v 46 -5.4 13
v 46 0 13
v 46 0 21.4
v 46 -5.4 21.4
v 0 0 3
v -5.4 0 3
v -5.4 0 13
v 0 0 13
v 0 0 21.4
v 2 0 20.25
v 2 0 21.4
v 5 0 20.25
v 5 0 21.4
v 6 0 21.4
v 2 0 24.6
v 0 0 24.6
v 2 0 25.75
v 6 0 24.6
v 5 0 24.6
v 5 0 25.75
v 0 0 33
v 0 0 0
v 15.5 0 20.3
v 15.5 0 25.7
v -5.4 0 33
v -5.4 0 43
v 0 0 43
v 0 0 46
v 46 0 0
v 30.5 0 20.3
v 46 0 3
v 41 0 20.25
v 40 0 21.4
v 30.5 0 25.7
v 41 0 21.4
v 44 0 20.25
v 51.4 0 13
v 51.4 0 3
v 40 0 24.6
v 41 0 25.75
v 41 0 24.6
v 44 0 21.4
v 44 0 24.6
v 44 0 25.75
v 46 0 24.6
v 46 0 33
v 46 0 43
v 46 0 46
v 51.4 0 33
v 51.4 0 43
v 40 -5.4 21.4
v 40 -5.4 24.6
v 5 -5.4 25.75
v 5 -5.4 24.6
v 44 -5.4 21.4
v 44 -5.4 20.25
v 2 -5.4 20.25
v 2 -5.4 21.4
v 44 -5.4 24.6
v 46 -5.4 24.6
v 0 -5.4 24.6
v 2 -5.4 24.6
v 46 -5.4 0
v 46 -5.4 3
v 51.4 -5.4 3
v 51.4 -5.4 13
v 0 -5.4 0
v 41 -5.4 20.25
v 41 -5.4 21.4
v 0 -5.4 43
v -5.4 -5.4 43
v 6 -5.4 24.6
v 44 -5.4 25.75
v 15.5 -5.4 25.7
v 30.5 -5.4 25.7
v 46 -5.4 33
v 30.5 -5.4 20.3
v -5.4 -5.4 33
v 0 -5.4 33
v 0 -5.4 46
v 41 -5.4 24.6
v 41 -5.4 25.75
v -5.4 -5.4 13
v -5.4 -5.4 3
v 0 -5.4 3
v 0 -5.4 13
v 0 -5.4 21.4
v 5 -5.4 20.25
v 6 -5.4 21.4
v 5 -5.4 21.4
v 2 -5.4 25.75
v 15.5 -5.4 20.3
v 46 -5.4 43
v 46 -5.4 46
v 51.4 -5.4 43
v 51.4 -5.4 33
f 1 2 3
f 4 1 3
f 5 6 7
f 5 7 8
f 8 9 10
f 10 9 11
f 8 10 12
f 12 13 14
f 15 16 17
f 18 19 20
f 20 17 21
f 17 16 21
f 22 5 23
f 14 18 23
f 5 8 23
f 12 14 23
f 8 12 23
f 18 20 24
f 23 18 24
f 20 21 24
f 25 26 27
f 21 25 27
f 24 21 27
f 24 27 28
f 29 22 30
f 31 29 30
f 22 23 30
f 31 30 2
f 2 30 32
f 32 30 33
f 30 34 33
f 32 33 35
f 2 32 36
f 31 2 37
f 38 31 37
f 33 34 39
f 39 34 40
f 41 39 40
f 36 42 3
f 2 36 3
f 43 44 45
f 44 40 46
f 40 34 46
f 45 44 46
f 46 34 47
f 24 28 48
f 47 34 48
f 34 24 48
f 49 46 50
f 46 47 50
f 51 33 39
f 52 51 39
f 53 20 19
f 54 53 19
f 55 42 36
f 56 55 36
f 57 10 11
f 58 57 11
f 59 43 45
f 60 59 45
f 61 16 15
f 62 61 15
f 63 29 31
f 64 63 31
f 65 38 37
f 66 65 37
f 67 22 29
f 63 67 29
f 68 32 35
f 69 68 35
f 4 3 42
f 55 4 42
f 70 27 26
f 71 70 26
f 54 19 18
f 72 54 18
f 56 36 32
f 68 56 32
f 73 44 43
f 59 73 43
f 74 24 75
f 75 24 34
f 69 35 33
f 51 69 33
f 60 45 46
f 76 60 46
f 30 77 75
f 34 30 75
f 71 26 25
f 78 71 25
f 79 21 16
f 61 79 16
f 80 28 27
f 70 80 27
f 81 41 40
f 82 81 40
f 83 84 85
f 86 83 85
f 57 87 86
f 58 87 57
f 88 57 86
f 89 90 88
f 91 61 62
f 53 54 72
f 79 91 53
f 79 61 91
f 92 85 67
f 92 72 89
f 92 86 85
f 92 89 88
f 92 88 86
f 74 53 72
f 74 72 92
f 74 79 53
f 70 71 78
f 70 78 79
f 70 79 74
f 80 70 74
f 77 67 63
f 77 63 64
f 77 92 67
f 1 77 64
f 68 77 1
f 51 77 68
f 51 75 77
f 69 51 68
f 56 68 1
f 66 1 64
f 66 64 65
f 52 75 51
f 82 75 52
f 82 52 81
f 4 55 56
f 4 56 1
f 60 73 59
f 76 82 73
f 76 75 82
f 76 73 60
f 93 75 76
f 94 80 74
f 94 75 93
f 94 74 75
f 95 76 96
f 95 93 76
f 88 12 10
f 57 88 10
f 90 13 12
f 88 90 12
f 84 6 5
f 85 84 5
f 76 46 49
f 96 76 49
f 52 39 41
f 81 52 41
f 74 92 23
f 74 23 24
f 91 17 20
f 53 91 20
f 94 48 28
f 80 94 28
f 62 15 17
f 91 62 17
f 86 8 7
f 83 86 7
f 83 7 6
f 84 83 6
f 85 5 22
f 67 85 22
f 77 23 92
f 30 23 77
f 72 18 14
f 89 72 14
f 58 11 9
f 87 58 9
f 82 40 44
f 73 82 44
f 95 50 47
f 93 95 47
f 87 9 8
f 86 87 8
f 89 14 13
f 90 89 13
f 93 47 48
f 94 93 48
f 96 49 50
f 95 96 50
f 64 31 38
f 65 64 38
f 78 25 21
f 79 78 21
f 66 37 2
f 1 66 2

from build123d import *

# Parameters (mm, degrees)
F1_W     = 15
F1_H     = 5.4
F2_DEPTH = 5.4


with BuildPart() as f2:
    # F1 (on Front) → F2 (new body)
    with BuildSketch(Plane.XZ):
        Polygon((0, 3), (0, 0), (46, 0), (46, 3), (51.4, 3), (51.4, 13), (46, 13), (46, 21.4), (44, 21.4), (44, 20.25), (41, 20.25), (41, 21.4), (40, 21.4), (40, 23), (40, 24.6), (41, 24.6), (41, 25.75), (44, 25.75), (44, 24.6), (46, 24.6), (46, 33), (51.4, 33), (51.4, 43), (46, 43), (46, 46), (0, 46), (0, 43), (-5.4, 43), (-5.4, 33), (0, 33), (0, 24.6), (2, 24.6), (2, 25.75), (5, 25.75), (5, 24.6), (6, 24.6), (6, 23), (6, 21.4), (5, 21.4), (5, 20.25), (2, 20.25), (2, 21.4), (0, 21.4), (0, 13), (-5.4, 13), (-5.4, 3), align=None)
        with Locations((23, 23)):
            Rectangle(F1_W, F1_H, mode=Mode.SUBTRACT)
    extrude(amount=F2_DEPTH)


solid = f2.part
